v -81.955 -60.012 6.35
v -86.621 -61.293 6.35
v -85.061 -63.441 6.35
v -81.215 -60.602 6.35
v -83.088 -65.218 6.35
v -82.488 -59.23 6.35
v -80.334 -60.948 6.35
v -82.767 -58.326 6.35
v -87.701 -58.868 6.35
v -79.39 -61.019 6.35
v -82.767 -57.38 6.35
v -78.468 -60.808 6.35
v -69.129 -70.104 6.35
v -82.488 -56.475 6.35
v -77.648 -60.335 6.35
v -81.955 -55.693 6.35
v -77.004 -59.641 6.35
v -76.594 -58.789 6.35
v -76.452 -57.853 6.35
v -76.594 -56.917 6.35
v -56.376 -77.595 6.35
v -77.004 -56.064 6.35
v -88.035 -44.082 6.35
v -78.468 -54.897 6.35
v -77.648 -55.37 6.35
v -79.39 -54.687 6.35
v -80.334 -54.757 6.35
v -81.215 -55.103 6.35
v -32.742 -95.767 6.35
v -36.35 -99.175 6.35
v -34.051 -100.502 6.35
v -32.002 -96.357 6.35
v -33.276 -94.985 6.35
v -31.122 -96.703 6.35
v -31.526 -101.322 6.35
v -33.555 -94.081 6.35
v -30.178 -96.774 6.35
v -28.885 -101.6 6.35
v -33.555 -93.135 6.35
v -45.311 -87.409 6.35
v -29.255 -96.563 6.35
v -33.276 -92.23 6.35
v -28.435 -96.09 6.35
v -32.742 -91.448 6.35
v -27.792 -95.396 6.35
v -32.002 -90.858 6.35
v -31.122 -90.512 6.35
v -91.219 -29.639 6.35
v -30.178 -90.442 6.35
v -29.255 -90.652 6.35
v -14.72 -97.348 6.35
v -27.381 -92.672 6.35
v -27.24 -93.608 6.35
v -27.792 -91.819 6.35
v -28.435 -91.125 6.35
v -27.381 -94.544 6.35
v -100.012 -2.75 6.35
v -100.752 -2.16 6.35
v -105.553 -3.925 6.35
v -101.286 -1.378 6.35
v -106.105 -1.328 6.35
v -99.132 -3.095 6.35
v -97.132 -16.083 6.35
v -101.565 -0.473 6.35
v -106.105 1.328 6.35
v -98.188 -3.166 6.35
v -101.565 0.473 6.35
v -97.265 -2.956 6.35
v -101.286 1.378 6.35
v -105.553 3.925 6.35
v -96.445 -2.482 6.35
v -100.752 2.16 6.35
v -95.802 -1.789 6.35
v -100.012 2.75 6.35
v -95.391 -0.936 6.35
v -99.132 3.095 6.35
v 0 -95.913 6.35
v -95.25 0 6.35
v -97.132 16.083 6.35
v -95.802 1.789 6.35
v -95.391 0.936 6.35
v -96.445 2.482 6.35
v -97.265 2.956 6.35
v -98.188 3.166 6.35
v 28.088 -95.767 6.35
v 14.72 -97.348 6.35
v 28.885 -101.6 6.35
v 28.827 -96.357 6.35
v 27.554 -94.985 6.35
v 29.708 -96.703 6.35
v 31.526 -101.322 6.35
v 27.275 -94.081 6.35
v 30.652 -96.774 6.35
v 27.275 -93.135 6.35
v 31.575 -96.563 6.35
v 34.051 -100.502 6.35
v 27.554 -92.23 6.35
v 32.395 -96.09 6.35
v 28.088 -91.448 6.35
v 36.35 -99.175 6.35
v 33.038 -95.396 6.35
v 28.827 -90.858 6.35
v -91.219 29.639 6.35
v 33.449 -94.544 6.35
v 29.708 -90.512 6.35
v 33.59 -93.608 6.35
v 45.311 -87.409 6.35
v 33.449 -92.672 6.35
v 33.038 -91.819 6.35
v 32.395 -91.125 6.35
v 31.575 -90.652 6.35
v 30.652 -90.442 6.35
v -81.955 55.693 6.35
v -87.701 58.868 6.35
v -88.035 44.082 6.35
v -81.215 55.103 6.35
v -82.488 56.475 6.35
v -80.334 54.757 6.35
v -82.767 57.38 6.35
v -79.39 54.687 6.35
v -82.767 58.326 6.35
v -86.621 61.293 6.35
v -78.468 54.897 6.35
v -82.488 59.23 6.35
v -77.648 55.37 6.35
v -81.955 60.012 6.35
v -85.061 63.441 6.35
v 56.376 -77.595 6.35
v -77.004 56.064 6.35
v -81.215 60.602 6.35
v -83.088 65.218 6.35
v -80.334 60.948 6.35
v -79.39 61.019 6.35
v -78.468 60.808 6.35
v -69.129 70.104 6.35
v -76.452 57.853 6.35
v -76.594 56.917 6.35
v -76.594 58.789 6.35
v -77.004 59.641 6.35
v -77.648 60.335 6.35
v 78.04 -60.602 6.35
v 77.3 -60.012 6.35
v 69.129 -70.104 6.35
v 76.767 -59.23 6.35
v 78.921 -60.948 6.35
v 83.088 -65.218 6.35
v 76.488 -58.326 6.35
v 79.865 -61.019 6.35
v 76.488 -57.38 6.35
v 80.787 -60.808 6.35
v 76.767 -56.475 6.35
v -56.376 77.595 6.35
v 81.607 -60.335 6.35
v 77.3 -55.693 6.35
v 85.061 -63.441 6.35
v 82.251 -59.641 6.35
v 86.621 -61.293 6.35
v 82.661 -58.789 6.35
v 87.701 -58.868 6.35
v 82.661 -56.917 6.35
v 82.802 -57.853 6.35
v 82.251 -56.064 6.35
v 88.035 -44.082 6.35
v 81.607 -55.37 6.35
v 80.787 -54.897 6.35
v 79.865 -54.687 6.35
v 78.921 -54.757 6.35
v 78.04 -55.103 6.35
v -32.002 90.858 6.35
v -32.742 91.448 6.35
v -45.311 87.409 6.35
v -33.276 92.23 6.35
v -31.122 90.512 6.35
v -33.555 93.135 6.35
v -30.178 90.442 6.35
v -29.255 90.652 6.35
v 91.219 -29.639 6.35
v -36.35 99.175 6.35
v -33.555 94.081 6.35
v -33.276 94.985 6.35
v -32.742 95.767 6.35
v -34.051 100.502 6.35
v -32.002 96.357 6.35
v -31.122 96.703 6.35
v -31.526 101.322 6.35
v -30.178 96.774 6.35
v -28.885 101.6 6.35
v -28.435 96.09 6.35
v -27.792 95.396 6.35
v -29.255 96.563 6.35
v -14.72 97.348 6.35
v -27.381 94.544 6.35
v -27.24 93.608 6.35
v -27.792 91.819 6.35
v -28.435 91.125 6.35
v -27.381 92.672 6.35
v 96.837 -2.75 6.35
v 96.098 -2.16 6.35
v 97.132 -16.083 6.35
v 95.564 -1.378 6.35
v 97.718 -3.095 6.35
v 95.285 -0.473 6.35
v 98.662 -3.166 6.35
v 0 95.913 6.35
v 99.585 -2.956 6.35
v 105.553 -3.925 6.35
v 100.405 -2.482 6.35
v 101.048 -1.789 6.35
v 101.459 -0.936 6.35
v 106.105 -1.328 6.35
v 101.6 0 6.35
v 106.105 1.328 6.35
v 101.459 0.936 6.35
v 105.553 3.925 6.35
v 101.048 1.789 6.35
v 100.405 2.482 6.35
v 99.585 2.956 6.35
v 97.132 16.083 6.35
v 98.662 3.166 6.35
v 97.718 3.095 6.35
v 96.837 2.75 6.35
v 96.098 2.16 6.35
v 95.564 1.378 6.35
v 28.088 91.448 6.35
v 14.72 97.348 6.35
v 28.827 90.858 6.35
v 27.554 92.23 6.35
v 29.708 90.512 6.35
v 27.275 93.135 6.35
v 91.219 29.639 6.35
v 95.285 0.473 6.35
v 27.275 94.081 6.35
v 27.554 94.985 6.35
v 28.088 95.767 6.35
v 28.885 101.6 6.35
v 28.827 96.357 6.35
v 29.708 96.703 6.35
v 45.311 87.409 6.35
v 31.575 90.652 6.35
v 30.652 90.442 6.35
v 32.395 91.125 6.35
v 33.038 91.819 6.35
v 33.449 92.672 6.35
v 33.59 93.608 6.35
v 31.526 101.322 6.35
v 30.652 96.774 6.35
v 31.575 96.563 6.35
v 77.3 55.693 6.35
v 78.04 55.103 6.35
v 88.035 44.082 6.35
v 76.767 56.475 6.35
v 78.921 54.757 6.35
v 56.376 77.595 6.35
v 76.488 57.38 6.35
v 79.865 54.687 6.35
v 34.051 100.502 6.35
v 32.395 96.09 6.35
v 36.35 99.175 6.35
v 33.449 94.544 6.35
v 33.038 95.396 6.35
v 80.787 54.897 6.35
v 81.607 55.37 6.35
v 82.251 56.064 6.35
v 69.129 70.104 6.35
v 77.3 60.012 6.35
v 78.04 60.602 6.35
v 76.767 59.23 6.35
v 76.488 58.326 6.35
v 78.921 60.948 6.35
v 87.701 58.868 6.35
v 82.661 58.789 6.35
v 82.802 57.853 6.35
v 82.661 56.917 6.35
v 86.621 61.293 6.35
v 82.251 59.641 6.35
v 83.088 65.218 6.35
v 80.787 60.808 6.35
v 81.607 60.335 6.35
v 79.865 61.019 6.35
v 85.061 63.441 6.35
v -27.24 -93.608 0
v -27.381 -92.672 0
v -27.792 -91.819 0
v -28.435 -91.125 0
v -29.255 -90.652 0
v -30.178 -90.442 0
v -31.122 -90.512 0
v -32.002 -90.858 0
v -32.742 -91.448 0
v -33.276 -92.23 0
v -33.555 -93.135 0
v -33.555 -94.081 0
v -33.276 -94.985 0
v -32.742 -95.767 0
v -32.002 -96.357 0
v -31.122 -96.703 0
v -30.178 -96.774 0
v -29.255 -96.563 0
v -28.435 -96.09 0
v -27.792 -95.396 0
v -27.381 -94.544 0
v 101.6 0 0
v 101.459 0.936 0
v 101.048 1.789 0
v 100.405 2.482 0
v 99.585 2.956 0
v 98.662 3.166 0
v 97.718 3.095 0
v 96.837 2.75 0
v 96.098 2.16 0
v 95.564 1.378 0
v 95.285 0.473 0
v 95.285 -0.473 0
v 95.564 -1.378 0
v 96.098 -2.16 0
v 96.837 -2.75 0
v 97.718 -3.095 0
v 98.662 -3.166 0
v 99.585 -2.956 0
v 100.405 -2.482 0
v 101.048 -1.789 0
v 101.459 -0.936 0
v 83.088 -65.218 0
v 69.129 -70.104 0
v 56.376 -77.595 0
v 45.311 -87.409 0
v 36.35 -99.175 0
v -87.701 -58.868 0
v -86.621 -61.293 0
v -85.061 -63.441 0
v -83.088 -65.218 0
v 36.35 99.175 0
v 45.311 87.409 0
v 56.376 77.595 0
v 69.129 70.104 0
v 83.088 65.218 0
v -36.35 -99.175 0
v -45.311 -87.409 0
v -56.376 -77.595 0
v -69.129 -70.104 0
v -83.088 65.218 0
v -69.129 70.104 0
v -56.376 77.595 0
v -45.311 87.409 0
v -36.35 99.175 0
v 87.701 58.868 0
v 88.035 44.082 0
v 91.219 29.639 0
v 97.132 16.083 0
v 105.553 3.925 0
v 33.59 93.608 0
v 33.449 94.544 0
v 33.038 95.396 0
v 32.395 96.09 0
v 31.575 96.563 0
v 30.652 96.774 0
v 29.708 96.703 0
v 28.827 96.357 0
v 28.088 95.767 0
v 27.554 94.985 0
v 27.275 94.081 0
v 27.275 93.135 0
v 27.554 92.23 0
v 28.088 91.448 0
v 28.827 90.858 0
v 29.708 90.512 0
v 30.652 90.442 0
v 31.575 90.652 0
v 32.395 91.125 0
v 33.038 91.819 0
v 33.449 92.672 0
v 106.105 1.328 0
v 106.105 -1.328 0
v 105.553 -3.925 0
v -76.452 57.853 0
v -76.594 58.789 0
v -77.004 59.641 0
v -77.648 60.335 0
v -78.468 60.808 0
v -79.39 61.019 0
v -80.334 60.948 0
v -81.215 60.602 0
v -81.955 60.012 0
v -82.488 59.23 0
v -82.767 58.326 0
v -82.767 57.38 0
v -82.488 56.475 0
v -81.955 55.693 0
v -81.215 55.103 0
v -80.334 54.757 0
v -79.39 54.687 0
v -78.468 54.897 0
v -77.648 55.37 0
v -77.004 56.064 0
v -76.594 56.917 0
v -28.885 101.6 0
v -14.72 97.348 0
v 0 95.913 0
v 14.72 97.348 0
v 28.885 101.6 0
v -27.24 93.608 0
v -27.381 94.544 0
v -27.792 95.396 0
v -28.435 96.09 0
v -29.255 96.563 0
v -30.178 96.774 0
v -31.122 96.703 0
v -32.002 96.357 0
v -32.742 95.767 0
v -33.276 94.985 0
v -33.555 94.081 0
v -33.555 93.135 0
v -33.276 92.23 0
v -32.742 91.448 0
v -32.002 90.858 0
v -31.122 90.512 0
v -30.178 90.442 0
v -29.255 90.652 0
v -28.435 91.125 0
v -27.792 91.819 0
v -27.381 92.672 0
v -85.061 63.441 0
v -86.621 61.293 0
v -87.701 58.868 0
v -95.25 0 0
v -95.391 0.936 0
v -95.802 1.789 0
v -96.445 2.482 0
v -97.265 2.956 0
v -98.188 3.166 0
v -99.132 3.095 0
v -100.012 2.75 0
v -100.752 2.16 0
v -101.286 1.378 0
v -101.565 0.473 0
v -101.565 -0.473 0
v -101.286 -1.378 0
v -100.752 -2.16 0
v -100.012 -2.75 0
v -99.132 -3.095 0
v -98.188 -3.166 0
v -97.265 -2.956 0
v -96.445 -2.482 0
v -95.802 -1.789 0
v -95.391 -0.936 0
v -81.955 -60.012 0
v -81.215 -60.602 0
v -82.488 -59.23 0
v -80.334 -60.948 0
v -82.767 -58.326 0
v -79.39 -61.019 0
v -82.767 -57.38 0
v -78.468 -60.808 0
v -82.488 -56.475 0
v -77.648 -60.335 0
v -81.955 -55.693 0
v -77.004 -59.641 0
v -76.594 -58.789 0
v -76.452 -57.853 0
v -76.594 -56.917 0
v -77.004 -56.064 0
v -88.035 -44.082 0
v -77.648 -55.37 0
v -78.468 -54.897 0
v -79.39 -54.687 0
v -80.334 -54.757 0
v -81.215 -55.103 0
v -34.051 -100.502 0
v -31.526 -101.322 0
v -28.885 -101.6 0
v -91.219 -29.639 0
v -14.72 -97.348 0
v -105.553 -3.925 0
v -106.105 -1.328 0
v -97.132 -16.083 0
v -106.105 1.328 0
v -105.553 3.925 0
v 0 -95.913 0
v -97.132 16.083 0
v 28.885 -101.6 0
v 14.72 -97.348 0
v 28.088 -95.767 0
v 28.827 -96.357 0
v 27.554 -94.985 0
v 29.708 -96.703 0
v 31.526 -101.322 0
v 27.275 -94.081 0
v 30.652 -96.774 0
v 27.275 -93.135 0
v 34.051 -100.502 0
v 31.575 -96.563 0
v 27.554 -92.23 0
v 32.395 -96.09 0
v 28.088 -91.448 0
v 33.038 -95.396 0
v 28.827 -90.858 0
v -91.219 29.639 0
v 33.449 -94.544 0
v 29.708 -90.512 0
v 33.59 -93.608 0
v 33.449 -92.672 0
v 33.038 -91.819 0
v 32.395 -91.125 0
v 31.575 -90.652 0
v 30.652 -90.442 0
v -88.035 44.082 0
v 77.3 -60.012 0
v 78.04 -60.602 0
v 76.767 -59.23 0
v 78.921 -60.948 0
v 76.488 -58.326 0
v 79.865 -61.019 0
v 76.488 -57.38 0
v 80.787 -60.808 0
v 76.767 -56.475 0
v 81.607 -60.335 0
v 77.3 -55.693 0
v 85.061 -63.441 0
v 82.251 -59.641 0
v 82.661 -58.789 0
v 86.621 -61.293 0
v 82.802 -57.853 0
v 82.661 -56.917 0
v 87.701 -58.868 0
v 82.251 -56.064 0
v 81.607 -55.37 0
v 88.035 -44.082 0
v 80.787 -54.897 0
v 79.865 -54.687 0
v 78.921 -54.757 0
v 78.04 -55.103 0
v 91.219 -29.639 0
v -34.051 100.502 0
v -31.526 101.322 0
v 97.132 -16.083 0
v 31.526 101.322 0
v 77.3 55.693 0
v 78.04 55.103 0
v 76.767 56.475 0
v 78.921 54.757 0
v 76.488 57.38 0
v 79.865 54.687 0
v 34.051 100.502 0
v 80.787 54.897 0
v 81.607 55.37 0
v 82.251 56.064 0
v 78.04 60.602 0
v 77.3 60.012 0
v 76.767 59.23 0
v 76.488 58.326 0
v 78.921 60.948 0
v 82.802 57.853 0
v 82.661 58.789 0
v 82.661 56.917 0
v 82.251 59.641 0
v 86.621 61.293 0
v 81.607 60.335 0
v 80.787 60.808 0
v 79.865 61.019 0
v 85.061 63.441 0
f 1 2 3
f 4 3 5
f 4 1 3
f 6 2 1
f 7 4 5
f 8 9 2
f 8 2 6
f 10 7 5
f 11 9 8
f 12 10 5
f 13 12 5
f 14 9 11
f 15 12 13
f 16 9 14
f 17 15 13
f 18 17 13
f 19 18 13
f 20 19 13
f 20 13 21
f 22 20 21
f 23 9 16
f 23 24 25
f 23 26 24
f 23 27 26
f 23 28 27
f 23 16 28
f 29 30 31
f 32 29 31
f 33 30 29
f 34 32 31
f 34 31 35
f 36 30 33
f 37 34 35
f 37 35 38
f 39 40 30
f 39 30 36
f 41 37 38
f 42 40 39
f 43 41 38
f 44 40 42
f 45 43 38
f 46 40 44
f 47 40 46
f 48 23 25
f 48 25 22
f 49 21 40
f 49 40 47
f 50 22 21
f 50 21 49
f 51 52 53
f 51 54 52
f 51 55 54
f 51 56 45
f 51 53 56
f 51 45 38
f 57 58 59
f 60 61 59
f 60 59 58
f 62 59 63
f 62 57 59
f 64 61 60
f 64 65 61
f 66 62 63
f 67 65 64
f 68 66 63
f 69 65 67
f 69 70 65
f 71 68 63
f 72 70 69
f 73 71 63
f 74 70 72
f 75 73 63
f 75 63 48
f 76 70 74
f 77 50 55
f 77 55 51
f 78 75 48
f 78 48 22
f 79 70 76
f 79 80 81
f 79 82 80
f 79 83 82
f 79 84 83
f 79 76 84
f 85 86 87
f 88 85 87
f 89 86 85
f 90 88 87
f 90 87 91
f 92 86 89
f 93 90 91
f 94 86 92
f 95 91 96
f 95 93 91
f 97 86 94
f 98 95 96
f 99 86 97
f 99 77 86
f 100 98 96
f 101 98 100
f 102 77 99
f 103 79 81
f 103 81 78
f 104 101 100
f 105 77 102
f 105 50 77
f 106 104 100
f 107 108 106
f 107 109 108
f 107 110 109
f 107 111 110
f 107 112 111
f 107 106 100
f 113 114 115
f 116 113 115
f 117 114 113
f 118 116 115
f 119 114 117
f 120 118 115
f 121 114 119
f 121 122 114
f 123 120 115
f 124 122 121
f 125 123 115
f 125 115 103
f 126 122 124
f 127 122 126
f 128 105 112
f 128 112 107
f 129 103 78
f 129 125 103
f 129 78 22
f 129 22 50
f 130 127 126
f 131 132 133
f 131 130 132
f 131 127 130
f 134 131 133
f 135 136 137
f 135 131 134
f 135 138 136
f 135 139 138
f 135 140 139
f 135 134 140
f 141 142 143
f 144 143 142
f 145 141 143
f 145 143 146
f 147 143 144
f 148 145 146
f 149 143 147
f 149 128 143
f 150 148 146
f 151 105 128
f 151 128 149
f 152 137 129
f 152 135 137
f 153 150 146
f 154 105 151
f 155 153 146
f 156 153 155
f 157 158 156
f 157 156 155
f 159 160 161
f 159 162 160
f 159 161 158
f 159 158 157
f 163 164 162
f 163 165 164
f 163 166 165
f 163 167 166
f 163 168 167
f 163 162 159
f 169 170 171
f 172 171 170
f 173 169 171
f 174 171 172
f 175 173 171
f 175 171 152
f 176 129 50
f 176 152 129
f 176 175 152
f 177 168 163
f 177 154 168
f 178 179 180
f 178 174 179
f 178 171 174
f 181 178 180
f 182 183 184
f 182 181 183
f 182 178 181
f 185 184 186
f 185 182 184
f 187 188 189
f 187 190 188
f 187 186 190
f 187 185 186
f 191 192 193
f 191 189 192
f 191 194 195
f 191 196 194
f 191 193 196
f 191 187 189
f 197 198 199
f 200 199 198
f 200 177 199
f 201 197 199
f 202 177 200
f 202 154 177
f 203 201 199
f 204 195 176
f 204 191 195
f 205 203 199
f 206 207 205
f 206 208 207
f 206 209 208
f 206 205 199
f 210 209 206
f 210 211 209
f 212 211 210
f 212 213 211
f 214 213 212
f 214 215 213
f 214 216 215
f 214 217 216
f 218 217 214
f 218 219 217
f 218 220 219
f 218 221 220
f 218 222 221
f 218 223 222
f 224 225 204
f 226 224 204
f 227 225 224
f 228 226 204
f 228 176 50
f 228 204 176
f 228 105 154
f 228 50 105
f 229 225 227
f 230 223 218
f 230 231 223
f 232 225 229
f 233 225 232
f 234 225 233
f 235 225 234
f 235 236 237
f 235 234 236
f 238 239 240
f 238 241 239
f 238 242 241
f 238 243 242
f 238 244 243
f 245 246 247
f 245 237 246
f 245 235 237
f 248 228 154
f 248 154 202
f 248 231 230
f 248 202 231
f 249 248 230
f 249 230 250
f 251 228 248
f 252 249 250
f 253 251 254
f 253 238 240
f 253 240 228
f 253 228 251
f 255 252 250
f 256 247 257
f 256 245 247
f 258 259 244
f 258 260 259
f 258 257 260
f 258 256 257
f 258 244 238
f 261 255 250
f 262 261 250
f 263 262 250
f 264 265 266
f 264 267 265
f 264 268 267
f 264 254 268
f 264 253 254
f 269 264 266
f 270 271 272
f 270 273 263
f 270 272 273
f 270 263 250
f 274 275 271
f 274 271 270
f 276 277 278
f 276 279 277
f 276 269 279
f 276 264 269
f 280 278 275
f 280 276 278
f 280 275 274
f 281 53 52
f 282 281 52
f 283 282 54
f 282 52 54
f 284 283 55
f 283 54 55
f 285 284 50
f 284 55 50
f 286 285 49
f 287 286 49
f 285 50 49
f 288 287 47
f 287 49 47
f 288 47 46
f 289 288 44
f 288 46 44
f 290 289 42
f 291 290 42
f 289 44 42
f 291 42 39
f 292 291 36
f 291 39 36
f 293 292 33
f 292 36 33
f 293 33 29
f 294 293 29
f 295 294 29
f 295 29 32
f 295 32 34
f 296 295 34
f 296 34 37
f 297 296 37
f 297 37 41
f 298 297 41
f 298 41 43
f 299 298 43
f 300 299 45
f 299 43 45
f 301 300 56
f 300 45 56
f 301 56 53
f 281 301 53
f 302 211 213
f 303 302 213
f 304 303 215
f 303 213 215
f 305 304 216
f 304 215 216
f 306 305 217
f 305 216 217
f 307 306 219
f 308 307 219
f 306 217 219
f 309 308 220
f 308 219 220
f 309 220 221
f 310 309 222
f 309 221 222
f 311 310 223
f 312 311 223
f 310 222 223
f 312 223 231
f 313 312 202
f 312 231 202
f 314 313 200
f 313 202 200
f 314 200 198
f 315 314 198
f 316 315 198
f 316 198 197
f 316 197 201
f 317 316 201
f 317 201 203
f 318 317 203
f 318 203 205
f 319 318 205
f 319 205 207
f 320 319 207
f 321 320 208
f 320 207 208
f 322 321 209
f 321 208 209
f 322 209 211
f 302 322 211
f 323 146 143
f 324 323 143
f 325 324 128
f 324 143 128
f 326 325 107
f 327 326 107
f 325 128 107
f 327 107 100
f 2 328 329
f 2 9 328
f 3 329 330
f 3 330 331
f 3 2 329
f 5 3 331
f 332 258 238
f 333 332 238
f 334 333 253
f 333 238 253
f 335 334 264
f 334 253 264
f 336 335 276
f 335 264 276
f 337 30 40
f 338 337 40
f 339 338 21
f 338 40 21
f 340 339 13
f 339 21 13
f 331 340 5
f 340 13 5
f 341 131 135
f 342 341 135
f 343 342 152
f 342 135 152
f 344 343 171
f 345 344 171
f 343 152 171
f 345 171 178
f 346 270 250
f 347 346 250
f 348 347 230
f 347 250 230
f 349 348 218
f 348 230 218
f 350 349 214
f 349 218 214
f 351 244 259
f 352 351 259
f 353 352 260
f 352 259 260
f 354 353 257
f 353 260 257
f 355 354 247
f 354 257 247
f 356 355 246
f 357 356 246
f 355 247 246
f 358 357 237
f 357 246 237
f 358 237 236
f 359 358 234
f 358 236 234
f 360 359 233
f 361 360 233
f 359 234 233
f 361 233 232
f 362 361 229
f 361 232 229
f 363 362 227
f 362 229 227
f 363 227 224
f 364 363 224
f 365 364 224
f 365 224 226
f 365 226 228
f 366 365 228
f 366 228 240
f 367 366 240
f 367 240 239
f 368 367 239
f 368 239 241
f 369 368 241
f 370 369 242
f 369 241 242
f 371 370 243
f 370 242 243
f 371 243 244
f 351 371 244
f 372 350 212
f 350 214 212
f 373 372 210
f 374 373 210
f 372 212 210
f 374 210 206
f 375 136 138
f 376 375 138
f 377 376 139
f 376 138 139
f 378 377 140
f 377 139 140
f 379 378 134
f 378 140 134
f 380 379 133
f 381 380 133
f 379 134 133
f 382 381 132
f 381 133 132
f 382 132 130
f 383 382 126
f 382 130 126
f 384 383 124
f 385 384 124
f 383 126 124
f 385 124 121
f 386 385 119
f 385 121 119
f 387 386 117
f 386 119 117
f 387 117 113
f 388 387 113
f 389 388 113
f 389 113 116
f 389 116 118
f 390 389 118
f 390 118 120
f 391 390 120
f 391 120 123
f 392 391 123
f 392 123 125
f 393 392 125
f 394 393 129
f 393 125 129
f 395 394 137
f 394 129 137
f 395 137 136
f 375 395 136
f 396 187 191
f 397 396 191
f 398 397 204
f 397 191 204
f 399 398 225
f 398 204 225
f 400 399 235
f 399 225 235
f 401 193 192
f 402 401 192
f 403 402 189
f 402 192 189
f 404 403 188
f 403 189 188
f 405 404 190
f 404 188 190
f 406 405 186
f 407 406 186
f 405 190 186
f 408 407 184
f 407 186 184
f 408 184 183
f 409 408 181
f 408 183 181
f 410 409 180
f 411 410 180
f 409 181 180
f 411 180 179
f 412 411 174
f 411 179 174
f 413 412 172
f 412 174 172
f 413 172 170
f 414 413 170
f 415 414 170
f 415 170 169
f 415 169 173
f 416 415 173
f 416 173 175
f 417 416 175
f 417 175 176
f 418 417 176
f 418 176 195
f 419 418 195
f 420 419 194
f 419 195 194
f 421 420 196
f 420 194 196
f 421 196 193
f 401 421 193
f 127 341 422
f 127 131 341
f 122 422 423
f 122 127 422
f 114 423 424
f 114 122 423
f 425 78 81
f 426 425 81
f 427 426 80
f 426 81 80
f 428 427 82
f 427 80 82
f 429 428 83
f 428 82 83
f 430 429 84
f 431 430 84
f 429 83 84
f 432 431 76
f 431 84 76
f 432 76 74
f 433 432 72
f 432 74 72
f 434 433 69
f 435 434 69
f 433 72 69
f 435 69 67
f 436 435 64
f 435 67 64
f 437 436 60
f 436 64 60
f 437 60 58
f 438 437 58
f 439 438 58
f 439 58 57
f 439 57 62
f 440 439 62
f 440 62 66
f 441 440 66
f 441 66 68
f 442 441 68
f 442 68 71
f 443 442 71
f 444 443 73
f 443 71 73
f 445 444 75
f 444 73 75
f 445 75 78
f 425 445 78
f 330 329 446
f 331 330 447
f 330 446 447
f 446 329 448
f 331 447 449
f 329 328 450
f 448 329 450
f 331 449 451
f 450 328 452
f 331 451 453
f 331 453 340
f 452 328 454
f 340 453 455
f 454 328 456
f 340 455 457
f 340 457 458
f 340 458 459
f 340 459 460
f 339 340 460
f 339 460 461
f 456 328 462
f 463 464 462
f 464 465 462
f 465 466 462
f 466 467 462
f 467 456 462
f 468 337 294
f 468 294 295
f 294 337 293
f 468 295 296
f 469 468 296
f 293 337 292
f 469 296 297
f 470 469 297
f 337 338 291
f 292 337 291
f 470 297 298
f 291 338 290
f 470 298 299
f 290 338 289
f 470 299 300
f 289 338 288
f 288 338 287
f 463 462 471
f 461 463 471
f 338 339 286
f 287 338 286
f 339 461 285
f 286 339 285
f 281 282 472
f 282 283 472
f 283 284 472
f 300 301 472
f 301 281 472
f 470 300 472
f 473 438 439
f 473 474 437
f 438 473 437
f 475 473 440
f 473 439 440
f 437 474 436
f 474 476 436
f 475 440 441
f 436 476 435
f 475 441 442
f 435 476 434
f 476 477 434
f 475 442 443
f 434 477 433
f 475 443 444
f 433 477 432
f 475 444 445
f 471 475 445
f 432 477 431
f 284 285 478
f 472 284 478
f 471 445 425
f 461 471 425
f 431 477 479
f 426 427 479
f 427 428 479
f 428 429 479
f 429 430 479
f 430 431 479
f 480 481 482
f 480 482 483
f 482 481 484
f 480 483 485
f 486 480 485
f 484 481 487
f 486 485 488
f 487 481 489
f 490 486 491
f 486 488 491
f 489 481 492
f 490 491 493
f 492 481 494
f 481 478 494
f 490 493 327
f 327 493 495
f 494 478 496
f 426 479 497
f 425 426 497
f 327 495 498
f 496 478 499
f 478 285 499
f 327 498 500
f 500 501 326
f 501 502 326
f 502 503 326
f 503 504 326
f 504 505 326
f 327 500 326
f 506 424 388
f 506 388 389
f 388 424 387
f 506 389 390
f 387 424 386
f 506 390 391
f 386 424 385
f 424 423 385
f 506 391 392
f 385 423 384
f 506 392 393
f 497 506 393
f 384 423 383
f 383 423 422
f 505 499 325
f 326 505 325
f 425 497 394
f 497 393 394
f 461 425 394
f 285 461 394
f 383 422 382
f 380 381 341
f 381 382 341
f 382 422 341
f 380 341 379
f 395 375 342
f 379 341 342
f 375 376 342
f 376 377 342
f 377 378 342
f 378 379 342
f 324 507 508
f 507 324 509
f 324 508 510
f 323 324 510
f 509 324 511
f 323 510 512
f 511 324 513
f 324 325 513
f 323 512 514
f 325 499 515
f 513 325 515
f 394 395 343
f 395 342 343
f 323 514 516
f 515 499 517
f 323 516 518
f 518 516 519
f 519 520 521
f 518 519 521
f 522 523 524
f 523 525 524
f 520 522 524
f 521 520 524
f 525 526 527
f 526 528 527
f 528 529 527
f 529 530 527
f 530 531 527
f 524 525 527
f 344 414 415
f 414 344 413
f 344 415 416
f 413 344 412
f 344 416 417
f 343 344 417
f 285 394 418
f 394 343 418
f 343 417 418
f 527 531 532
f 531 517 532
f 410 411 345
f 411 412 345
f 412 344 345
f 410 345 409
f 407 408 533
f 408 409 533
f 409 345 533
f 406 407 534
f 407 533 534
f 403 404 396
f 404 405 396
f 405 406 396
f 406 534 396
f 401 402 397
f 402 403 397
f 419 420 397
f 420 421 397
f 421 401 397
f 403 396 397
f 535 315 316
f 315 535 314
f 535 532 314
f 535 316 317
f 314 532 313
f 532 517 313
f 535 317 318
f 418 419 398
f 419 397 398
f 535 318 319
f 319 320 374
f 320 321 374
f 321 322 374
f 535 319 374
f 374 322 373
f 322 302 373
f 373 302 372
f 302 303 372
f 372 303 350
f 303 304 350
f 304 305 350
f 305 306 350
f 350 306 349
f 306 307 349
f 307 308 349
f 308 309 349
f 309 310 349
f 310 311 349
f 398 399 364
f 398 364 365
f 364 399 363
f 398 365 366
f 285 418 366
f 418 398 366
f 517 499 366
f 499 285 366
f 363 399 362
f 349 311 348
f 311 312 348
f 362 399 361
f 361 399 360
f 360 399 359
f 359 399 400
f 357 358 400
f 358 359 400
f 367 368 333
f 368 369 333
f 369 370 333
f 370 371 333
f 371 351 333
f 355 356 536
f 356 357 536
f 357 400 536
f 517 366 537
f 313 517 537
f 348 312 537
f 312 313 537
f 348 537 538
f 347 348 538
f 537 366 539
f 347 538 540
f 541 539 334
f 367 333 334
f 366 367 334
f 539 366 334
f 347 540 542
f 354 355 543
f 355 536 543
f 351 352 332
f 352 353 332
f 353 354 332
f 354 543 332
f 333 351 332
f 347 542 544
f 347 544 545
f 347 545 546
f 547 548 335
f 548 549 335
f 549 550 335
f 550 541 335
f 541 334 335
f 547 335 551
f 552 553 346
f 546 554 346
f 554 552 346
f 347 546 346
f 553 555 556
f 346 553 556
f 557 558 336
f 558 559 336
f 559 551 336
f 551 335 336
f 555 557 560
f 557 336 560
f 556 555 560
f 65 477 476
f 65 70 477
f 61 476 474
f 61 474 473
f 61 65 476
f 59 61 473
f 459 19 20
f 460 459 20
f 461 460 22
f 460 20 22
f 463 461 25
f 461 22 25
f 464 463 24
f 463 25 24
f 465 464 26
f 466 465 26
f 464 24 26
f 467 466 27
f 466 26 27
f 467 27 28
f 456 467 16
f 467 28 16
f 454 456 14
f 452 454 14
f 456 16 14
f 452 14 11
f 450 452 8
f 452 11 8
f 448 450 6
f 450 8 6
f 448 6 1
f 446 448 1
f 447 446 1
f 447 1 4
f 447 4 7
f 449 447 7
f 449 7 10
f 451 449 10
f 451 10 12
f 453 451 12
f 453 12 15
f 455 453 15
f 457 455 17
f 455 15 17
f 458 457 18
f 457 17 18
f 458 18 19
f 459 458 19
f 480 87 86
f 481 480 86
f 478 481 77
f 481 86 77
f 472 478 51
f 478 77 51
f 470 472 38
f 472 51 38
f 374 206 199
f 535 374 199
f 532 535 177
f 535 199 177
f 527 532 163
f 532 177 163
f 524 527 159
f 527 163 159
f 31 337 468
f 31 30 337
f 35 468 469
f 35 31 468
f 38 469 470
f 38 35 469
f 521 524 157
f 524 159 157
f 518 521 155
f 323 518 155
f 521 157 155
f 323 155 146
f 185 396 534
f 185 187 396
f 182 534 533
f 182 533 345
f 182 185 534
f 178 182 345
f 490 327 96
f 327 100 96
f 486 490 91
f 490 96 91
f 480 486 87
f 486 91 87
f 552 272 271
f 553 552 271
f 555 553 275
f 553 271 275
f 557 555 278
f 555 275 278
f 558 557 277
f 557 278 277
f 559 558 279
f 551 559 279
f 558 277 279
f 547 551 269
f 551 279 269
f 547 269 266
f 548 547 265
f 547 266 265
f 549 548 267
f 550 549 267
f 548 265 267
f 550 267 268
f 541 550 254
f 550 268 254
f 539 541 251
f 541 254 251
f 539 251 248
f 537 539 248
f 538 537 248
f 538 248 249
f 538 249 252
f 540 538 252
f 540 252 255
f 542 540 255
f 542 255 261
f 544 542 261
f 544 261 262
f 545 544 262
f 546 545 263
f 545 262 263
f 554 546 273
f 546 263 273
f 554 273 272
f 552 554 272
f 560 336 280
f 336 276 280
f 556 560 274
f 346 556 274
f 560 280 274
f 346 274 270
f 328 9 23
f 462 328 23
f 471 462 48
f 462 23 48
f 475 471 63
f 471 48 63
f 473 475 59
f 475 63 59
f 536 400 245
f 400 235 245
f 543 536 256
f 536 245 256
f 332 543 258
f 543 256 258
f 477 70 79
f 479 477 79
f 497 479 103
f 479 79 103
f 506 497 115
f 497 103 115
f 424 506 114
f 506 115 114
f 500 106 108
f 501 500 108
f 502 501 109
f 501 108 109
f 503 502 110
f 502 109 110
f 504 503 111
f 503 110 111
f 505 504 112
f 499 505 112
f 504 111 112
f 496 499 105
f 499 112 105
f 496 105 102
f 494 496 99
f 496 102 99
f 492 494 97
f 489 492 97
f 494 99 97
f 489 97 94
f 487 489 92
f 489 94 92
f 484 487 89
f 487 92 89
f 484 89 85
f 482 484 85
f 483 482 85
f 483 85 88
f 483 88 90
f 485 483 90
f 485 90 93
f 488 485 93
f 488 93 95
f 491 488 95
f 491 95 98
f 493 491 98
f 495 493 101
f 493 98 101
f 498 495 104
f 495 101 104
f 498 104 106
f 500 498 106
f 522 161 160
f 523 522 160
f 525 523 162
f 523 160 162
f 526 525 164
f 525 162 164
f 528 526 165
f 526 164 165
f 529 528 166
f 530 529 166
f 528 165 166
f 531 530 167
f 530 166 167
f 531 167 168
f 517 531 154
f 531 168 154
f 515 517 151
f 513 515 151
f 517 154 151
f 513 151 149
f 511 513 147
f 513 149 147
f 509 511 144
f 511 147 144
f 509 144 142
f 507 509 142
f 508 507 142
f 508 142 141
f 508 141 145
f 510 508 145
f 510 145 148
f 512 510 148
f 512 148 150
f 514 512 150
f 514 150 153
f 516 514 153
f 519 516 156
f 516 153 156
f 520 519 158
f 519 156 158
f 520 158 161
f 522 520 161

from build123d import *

# Parameters (mm, degrees)
F1_DEPTH = 6.35
F2_R     = 3.175
F3_DEPTH = 6.35
F4_R     = 12.7
F6_DEPTH = 6.35


with BuildPart() as f1:
    # F0 (on Top) → F1 (new body)
    with BuildSketch(Plane.XY):
        Polygon((33.0118411373, 101.6), (-33.0118411373, 101.6), (-86.4261221286, 62.792253257), (-106.8285619826, 0), (-86.4261221286, -62.792253257), (-33.0118411373, -101.6), (33.0118411373, -101.6), (86.4261221286, -62.792253257), (106.8285619826, 0), (86.4261221286, 62.792253257), align=None)
    extrude(amount=F1_DEPTH)

    # F2 (on face) → F3 (cut, through all)
    with BuildSketch(Plane.XY.offset(6.35)):
        with Locations((-30.4149976714, 93.6077376164)):
            Circle(F2_R)
        with Locations((-79.6274976714, 57.8527634569)):
            Circle(F2_R)
        with Locations((-98.425, 0)):
            Circle(F2_R)
        with Locations((-79.6274976714, -57.8527634569)):
            Circle(F2_R)
        with Locations((-30.4149976714, -93.6077376164)):
            Circle(F2_R)
        with Locations((30.4149976714, -93.6077376164)):
            Circle(F2_R)
        with Locations((79.6274976714, -57.8527634569)):
            Circle(F2_R)
        with Locations((98.425, 0)):
            Circle(F2_R)
        with Locations((79.6274976714, 57.8527634569)):
            Circle(F2_R)
        with Locations((30.4149976714, 93.6077376164)):
            Circle(F2_R)
    extrude(amount=-F3_DEPTH, mode=Mode.SUBTRACT)

    # F4
    f4_edges = [f1.edges().sort_by_distance(p)[0] for p in [
        (-86.426122, 62.792253, 3.175),
        (-106.828562, 0, 3.175),
        (-86.426122, -62.792253, 3.175),
        (-33.011841, -101.6, 3.175),
        (33.011841, -101.6, 3.175),
        (86.426122, -62.792253, 3.175),
        (106.828562, 0, 3.175),
        (33.011841, 101.6, 3.175),
        (86.426122, 62.792253, 3.175),
        (-33.011841, 101.6, 3.175),
    ]]
    fillet(f4_edges, radius=F4_R)

    # F5 (on face) → F6 (cut, through all)
    with BuildSketch(Plane.XY.offset(6.35)):
        with BuildLine():
            Line((28.8853609951, 101.6), (-28.8853609951, 101.6))
            ThreePointArc((-28.8853609951, 101.6), (0, 95.9129485994), (28.8853609951, 101.6))
        make_face()
        with BuildLine():
            Line((-36.3502336992, 99.1745158286), (-83.0877295666, 65.2177374284))
            ThreePointArc((-83.0877295666, 65.2177374284), (-56.3762166906, 77.5952053975), (-36.3502336992, 99.1745158286))
        make_face()
        with BuildLine():
            Line((-87.7012746194, 58.8677374284), (-105.5534094917, 3.9245158286))
            ThreePointArc((-105.5534094917, 3.9245158286), (-91.2186347625, 29.6387310978), (-87.7012746194, 58.8677374284))
        make_face()
        with BuildLine():
            Line((-105.5534094917, -3.9245158286), (-87.7012746194, -58.8677374284))
            ThreePointArc((-87.7012746194, -58.8677374284), (-91.2186347625, -29.6387310978), (-105.5534094917, -3.9245158286))
        make_face()
        with BuildLine():
            Line((-83.0877295666, -65.2177374284), (-36.3502336992, -99.1745158286))
            ThreePointArc((-36.3502336992, -99.1745158286), (-56.3762166906, -77.5952053975), (-83.0877295666, -65.2177374284))
        make_face()
        with BuildLine():
            Line((-28.8853609951, -101.6), (28.8853609951, -101.6))
            ThreePointArc((28.8853609951, -101.6), (0, -95.9129485994), (-28.8853609951, -101.6))
        make_face()
        with BuildLine():
            Line((36.3502336992, -99.1745158286), (83.0877295666, -65.2177374284))
            ThreePointArc((83.0877295666, -65.2177374284), (56.3762166906, -77.5952053975), (36.3502336992, -99.1745158286))
        make_face()
        with BuildLine():
            Line((87.7012746194, -58.8677374284), (105.5534094917, -3.9245158286))
            ThreePointArc((105.5534094917, -3.9245158286), (91.2186347625, -29.6387310978), (87.7012746194, -58.8677374284))
        make_face()
        with BuildLine():
            Line((105.5534094917, 3.9245158286), (87.7012746194, 58.8677374284))
            ThreePointArc((87.7012746194, 58.8677374284), (91.2186347625, 29.6387310978), (105.5534094917, 3.9245158286))
        make_face()
        with BuildLine():
            Line((83.0877295666, 65.2177374284), (36.3502336992, 99.1745158286))
            ThreePointArc((36.3502336992, 99.1745158286), (56.3762166906, 77.5952053975), (83.0877295666, 65.2177374284))
        make_face()
    extrude(amount=-F6_DEPTH, mode=Mode.SUBTRACT)


solid = f1.part
